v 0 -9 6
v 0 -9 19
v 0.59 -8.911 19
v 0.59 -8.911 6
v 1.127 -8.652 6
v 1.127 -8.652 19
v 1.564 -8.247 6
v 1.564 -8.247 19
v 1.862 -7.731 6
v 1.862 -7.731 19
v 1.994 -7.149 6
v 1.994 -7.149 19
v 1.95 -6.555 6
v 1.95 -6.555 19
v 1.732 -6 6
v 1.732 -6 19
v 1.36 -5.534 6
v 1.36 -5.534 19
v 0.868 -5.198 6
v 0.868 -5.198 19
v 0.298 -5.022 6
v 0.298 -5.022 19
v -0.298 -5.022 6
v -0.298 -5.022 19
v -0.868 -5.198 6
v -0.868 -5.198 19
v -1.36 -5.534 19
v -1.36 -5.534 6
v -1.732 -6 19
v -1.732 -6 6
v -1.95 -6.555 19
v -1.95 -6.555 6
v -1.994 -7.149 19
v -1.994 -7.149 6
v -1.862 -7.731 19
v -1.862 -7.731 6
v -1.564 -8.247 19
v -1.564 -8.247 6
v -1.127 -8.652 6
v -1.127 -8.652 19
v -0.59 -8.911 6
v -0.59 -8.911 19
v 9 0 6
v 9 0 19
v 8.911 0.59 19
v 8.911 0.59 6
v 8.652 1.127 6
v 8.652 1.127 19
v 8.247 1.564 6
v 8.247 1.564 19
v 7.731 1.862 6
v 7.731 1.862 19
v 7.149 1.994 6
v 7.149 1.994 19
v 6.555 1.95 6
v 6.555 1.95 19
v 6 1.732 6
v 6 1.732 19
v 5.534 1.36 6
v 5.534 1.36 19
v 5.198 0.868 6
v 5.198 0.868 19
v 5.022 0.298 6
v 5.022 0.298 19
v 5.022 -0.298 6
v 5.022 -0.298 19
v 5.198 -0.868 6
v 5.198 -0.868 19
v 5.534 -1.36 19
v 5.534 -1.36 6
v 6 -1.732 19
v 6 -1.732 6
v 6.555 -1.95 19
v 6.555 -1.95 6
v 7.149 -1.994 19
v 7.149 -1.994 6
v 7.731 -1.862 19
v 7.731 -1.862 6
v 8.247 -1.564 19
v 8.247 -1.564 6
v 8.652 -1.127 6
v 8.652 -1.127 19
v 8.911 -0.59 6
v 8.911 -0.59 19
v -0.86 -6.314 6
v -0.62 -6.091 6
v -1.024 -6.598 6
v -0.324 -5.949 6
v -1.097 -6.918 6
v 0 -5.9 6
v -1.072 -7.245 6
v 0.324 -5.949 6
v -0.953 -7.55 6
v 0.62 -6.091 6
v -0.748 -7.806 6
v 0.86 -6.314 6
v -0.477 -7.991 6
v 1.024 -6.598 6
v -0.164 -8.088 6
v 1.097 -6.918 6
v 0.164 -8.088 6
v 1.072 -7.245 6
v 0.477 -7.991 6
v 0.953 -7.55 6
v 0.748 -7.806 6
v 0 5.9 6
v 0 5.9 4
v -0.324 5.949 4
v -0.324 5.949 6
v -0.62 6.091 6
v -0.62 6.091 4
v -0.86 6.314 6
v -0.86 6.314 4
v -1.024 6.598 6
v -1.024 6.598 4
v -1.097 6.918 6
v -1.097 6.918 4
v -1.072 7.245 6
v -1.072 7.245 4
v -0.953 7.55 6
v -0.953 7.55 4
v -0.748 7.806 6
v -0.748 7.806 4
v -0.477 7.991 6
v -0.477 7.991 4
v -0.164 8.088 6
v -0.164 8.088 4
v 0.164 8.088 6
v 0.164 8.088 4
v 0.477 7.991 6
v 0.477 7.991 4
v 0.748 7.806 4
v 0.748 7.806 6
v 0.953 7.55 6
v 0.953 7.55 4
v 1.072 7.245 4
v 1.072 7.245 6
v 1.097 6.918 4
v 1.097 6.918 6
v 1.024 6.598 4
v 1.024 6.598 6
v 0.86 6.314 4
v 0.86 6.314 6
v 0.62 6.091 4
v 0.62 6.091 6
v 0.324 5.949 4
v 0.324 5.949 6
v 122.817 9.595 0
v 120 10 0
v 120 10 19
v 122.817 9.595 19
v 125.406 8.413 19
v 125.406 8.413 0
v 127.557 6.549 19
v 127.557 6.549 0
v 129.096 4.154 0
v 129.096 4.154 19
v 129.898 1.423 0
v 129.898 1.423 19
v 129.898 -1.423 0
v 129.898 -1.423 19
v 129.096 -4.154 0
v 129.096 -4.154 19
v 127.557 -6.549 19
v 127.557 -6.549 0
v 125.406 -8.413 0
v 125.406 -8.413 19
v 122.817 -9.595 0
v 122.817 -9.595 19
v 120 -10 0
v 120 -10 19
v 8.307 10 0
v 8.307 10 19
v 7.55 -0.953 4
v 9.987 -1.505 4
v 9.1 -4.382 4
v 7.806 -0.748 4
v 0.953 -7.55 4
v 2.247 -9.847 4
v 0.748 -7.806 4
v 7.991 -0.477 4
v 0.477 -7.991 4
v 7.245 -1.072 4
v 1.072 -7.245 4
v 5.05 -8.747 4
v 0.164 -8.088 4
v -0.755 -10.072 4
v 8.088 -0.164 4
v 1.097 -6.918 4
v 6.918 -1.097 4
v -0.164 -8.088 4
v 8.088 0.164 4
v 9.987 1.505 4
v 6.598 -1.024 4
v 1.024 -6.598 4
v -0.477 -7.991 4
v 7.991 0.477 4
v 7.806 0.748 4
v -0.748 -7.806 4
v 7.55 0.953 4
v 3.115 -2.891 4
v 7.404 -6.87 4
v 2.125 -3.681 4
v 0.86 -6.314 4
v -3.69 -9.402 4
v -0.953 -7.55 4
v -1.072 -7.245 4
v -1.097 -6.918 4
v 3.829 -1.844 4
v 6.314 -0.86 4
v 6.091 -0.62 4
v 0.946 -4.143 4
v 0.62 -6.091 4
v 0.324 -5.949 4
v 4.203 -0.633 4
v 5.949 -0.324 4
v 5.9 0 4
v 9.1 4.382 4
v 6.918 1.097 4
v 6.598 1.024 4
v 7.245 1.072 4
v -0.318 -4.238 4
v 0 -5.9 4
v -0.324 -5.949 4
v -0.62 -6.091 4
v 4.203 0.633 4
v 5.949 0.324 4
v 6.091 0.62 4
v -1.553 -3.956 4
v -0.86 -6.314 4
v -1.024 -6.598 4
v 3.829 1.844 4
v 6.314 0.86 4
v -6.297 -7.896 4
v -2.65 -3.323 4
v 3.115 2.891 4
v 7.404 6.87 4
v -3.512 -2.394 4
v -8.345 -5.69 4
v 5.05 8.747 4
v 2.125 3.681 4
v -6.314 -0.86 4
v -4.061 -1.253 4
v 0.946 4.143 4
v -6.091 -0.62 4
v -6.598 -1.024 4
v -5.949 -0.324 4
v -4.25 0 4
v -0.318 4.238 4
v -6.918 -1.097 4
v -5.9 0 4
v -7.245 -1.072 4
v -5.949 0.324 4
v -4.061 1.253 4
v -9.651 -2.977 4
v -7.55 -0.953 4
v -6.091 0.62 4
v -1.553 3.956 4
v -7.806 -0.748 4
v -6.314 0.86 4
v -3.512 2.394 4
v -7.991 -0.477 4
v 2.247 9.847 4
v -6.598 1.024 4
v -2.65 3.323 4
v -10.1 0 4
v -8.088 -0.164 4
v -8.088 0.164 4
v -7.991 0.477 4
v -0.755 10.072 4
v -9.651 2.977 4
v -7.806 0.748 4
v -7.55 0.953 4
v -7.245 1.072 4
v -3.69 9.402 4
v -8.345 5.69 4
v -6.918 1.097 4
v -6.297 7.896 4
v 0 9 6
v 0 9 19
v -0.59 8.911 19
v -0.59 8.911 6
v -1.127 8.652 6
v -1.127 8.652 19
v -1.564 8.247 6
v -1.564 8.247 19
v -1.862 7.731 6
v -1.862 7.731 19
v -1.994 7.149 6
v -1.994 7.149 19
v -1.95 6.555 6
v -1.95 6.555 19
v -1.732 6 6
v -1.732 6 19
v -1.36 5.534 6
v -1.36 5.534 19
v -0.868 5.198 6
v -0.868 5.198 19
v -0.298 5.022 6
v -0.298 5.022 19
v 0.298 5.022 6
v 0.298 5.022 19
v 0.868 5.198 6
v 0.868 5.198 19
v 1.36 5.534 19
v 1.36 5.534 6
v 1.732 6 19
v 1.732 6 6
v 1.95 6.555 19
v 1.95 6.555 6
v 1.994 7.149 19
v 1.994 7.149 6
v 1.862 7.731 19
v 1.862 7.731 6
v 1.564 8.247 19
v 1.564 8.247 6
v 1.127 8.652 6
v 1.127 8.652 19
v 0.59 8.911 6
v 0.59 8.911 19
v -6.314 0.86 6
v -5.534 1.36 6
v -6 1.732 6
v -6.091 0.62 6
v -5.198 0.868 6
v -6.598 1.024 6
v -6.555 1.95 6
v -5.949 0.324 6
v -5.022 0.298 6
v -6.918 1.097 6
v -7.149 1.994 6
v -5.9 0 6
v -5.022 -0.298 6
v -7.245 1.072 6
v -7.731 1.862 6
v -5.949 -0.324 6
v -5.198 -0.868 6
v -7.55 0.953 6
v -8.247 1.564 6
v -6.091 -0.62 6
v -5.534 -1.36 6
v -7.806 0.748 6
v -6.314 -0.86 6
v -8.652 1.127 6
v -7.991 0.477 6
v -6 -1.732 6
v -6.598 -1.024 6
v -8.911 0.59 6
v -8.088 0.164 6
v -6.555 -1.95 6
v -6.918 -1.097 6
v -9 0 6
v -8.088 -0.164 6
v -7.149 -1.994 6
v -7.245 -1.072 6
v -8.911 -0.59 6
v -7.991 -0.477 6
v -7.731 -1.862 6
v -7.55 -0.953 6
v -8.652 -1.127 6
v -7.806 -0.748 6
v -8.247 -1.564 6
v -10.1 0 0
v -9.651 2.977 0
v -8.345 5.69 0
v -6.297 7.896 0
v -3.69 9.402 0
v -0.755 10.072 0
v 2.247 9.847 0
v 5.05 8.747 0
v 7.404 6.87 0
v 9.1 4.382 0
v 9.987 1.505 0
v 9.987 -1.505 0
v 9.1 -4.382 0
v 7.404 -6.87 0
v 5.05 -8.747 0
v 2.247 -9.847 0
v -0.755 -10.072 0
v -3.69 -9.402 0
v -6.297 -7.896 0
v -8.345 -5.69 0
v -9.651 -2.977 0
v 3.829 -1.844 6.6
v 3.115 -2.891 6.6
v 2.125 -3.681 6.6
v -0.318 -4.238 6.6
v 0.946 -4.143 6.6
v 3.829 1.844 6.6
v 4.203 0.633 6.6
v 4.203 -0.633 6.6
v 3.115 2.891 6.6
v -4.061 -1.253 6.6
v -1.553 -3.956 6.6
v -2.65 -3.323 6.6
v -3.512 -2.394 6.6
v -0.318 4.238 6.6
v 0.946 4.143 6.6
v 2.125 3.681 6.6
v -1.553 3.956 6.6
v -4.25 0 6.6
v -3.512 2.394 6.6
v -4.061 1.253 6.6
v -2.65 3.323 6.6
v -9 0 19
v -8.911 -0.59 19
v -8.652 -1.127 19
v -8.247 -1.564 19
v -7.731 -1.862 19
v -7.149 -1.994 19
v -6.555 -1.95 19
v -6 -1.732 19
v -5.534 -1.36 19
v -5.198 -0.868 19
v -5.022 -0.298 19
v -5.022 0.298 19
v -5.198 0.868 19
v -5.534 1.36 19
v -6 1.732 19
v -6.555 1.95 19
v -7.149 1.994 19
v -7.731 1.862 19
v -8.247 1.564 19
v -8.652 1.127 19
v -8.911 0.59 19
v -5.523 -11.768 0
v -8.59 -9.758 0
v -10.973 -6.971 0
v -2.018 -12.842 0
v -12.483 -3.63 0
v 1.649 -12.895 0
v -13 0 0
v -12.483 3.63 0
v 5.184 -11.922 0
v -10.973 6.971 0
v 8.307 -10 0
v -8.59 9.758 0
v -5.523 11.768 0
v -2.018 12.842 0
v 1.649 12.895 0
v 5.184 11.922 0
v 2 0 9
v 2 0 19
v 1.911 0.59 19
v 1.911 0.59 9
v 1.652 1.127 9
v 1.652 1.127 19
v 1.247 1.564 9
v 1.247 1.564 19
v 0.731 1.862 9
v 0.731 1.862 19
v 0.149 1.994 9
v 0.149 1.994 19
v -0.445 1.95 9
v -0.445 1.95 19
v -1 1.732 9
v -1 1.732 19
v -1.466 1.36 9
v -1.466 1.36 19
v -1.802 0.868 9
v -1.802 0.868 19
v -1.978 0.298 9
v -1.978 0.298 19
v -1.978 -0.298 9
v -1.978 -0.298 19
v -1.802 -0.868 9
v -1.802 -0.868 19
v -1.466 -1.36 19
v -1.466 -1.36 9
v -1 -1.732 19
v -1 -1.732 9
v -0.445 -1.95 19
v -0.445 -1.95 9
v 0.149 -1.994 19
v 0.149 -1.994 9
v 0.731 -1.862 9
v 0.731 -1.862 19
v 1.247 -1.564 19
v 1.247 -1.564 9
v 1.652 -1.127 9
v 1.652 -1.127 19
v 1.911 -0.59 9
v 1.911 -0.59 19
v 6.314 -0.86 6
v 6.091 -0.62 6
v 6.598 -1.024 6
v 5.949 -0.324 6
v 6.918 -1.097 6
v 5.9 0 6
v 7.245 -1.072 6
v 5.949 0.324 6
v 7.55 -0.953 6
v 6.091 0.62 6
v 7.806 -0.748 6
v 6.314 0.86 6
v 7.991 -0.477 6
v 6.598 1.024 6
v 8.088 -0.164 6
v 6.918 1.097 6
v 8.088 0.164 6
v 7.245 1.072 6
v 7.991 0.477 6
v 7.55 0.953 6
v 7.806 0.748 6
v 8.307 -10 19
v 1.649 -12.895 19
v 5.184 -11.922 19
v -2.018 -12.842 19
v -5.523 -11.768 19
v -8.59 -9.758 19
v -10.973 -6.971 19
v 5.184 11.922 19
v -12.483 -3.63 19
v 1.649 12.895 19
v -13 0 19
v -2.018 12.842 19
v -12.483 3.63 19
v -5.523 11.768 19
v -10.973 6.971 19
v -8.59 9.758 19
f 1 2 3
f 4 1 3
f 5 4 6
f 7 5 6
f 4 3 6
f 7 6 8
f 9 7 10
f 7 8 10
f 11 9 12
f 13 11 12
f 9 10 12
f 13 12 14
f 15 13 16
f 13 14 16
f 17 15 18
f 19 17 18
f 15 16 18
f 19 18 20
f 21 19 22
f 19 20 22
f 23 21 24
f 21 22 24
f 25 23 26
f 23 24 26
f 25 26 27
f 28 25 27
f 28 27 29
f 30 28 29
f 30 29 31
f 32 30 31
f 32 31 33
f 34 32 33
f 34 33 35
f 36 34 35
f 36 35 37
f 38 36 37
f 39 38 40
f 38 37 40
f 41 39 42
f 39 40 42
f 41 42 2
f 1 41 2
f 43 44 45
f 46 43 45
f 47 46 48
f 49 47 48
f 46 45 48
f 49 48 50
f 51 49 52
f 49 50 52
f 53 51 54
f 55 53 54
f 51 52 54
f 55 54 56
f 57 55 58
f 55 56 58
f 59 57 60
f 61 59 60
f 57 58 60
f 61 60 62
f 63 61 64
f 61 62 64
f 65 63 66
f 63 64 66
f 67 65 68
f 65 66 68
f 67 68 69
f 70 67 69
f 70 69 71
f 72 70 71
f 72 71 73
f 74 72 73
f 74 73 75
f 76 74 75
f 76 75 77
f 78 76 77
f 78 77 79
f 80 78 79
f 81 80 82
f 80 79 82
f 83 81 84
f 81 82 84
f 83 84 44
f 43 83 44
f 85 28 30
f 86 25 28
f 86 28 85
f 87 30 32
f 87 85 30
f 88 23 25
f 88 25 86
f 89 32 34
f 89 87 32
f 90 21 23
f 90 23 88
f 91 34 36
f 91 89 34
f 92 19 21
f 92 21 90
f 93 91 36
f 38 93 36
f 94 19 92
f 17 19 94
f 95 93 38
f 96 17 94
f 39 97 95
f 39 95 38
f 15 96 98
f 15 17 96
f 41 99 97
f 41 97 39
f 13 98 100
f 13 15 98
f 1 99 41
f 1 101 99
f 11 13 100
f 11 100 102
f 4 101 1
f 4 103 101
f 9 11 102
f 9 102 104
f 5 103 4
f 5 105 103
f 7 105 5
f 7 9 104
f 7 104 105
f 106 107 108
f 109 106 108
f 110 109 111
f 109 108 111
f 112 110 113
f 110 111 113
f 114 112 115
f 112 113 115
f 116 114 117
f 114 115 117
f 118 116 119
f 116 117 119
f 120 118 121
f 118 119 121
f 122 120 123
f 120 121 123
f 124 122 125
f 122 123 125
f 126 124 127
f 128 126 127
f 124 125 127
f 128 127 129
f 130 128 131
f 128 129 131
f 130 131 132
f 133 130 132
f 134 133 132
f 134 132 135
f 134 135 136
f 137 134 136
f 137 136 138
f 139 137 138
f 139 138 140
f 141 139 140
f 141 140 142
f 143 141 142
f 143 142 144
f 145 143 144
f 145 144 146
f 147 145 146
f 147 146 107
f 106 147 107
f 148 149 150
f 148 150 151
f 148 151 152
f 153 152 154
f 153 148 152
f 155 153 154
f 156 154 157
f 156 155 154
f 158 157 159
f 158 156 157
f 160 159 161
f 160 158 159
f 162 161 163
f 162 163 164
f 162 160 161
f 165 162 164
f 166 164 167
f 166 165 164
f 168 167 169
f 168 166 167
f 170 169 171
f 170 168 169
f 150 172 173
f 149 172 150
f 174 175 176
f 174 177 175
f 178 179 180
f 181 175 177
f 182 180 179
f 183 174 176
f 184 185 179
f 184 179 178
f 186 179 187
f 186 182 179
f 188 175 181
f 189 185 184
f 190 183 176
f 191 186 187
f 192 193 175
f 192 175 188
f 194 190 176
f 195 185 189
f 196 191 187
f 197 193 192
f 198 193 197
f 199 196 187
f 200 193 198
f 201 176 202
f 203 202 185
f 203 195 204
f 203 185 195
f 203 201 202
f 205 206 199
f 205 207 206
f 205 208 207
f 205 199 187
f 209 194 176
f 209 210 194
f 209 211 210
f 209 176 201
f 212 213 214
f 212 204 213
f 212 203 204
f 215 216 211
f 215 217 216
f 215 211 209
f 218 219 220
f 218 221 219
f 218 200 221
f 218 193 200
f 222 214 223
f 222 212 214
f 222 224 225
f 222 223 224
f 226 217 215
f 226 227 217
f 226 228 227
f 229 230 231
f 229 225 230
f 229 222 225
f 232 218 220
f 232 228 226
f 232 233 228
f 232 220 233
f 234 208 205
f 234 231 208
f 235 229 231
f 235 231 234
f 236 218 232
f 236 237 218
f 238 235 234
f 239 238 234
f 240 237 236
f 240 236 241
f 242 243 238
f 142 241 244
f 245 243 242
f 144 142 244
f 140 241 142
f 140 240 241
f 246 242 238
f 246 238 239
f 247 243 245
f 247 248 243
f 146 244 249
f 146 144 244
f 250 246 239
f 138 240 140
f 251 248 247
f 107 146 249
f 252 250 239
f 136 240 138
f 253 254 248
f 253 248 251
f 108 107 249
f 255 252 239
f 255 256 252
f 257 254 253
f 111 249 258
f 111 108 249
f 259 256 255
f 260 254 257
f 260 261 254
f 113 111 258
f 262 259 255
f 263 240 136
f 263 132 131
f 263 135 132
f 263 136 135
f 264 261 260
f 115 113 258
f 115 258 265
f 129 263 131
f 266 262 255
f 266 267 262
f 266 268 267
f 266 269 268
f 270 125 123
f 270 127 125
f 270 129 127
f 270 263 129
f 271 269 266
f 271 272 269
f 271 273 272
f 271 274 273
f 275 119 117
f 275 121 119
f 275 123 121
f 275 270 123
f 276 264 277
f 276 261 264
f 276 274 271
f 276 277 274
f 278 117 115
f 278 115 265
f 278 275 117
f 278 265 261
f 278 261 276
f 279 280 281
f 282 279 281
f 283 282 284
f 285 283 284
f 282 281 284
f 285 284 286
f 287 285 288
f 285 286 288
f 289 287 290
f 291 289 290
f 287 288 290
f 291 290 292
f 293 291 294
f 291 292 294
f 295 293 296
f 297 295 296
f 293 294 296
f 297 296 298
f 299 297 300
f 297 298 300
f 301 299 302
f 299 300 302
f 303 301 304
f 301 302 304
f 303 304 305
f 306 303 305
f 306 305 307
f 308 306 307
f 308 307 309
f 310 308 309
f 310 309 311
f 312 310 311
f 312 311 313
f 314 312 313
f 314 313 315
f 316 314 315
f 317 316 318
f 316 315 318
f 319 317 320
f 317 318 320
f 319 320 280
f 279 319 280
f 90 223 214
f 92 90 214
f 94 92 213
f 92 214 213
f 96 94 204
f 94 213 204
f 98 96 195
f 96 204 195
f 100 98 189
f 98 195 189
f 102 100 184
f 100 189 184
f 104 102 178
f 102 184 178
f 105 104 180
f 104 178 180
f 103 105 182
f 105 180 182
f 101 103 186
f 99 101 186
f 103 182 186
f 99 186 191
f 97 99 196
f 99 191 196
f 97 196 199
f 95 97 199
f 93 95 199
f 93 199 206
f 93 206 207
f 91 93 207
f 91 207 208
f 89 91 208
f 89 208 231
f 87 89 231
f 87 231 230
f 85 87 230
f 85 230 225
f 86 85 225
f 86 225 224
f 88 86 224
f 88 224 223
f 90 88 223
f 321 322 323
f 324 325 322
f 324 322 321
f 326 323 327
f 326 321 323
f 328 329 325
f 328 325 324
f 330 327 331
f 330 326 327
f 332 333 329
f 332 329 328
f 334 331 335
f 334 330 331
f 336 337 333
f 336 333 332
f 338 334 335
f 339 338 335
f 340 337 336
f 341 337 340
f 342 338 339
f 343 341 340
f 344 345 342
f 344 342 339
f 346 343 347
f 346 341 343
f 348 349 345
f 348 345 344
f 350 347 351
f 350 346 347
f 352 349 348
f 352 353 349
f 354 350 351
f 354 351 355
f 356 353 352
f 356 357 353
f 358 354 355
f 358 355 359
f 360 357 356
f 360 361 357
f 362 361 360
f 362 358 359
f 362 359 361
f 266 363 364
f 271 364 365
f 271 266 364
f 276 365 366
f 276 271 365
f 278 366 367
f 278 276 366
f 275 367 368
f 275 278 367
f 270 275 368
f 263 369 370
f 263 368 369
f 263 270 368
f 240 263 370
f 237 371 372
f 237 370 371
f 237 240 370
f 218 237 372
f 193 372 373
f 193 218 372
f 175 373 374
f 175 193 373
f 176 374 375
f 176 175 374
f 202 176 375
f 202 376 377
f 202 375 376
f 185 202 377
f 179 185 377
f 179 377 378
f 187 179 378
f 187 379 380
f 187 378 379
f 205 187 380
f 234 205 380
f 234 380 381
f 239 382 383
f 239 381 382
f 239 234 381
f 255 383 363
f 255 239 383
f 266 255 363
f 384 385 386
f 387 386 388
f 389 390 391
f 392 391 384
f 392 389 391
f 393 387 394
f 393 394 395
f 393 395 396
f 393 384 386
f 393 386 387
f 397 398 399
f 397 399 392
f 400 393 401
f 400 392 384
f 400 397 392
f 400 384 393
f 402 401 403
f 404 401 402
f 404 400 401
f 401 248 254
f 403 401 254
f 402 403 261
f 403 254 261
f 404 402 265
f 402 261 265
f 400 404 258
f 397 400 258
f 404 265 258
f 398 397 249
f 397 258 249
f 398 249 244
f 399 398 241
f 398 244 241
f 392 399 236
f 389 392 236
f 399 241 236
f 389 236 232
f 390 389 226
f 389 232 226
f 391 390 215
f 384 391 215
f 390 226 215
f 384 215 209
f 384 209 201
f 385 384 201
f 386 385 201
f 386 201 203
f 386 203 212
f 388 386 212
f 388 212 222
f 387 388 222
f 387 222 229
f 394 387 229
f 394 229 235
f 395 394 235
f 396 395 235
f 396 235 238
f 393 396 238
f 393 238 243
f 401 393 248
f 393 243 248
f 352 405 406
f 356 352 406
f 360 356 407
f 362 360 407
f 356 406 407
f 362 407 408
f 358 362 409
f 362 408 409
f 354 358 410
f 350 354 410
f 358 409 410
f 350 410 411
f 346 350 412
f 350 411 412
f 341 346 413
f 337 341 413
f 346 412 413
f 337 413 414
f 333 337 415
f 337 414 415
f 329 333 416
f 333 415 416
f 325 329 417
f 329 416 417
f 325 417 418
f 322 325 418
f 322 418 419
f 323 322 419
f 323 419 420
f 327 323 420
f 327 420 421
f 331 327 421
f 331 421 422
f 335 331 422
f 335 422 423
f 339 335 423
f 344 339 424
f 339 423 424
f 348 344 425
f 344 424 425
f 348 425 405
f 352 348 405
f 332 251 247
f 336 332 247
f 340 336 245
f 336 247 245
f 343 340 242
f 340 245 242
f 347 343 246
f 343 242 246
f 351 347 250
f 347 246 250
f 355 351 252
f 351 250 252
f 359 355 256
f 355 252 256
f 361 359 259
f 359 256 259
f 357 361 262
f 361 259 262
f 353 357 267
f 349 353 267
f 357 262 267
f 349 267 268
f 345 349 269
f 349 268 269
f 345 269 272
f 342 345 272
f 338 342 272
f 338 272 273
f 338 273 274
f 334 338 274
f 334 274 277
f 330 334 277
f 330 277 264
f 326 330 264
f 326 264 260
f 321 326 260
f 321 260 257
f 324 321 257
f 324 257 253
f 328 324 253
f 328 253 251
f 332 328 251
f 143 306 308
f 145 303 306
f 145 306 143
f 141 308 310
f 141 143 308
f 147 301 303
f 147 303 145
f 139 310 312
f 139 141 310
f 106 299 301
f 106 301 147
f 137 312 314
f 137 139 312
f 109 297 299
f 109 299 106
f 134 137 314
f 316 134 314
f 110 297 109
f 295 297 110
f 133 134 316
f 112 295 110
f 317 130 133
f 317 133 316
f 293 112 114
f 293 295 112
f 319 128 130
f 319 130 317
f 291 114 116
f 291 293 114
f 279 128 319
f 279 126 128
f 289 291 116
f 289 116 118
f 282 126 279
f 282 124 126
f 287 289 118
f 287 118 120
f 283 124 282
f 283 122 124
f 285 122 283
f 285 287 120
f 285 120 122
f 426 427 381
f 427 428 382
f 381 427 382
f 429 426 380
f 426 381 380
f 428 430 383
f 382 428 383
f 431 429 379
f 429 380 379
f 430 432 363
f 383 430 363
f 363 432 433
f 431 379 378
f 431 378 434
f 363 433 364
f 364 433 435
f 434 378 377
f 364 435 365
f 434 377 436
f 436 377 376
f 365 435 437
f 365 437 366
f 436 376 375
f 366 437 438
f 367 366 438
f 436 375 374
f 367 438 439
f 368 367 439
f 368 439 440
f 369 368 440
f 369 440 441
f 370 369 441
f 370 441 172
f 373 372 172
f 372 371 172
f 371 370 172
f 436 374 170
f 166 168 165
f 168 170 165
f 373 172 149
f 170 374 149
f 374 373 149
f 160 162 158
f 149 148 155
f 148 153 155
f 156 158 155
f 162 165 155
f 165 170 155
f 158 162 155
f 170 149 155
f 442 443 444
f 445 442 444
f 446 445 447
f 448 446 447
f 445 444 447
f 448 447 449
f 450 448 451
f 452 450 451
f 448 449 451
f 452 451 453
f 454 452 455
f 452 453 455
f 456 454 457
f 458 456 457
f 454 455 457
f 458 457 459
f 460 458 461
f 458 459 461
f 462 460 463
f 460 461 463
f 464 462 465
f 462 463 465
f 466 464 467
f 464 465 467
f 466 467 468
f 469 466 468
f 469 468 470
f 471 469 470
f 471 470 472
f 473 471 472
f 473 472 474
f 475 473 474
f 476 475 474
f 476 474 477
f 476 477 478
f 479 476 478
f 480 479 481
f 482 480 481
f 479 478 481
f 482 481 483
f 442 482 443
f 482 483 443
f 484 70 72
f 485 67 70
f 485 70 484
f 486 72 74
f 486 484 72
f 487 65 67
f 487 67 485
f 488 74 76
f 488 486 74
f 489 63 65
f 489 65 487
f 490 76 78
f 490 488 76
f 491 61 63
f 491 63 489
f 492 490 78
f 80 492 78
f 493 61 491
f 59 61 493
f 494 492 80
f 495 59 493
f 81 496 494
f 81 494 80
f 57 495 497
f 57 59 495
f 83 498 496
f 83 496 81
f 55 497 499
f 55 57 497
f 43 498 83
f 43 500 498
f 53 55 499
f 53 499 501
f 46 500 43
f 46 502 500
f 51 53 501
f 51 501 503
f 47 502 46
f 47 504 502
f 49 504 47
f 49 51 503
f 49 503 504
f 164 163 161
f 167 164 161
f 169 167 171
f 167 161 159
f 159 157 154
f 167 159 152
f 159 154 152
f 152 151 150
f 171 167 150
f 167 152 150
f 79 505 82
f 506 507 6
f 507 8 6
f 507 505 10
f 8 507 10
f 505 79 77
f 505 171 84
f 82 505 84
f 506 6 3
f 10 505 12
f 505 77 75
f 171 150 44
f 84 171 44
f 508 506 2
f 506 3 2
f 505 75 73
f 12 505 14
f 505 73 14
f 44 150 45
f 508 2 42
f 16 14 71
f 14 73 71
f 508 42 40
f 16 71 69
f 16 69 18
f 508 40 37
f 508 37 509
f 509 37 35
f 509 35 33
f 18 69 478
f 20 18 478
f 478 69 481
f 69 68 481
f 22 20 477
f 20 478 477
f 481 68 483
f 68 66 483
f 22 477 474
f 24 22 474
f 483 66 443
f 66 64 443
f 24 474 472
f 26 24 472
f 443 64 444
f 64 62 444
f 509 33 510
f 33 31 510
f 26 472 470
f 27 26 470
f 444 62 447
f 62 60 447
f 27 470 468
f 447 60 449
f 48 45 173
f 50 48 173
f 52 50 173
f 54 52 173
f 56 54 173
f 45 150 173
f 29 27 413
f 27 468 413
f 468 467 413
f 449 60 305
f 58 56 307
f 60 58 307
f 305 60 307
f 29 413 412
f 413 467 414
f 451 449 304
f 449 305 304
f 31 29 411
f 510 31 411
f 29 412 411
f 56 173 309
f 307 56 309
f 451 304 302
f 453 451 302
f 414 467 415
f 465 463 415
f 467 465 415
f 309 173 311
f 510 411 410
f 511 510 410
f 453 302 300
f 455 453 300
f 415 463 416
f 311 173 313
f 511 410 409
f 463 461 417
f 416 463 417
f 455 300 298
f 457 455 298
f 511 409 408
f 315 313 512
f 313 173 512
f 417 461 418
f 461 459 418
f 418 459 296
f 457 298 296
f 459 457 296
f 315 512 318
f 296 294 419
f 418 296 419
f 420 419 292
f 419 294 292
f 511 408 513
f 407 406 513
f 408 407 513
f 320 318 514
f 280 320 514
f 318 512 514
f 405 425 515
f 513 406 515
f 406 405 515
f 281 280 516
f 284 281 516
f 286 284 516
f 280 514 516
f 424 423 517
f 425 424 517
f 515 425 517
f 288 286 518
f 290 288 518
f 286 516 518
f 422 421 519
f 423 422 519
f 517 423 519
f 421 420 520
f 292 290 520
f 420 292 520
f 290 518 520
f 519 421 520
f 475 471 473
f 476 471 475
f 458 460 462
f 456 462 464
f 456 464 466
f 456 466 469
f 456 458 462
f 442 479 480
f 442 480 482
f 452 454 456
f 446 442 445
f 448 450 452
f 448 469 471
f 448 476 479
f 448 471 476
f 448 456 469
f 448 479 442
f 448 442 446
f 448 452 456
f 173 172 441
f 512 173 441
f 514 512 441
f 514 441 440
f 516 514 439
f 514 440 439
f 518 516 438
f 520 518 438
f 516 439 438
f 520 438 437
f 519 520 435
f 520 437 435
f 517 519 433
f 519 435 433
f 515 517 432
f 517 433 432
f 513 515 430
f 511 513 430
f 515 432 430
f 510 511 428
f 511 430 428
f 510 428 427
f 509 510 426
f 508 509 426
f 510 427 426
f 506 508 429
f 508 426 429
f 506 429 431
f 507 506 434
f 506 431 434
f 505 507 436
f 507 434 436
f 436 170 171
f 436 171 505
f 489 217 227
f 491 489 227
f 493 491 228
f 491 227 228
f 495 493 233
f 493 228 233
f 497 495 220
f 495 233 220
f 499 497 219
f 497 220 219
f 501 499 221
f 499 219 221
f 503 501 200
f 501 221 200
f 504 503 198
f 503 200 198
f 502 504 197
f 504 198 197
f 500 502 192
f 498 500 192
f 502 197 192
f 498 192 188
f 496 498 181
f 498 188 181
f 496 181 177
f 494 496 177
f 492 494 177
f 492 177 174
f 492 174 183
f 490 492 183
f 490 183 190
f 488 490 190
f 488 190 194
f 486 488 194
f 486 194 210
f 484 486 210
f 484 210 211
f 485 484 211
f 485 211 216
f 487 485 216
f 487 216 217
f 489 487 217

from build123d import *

# Parameters (mm, degrees)
SKETCH1_R               = 13
ELBOW_BOSS_DEPTH        = 19
BAR_DEPTH               = 19
CUT_EXTRUDE1_DEPTH      = 133.022725317
CUT_EXTRUDE1_DEPTH_BACK = 4
SKETCH3_R               = 10.1
SKETCH4_R               = 4.25
CUT_EXTRUDE2_DEPTH      = 2.6
SKETCH5_R               = 2
CUT_EXTRUDE3_DEPTH      = 10
SKETCH6_R               = 2
CUT_EXTRUDE4_DEPTH      = 13
SKETCH7_R               = 1.1
CUT_EXTRUDE5_DEPTH      = 132.506653824
CIRPATTERN1_COUNT       = 4


with BuildPart() as part:
    # Sketch1 → Elbow Boss (new body)
    with BuildSketch(Plane.XY):
        Circle(SKETCH1_R)
    extrude(amount=ELBOW_BOSS_DEPTH)

    # Sketch2 → Bar (add)
    with BuildSketch(Plane.XY):
        with BuildLine():
            Line((0, 10), (120, 10))
            ThreePointArc((120, 10), (130, 0), (120, -10))
            Line((120, -10), (0, -10))
            ThreePointArc((0, -10), (-10, 0), (0, 10))
        make_face()
    extrude(amount=BAR_DEPTH)

    # Sketch3 → Cut-Extrude1 (cut, two sides: drawn at the far end of the back side and taken through both)
    with BuildSketch(Plane(origin=(0, 0, 0), x_dir=(-1, 0, 0), z_dir=(0, 0, -1)).offset(-CUT_EXTRUDE1_DEPTH_BACK)):
        Circle(SKETCH3_R)
    extrude(amount=CUT_EXTRUDE1_DEPTH + CUT_EXTRUDE1_DEPTH_BACK, mode=Mode.SUBTRACT)

    # Sketch4 → Cut-Extrude2 (cut)
    with BuildSketch(Plane(origin=(0, 0, 4), x_dir=(-1, 0, 0), z_dir=(0, 0, -1))):
        Circle(SKETCH4_R)
    extrude(amount=-CUT_EXTRUDE2_DEPTH, mode=Mode.SUBTRACT)

    # Sketch5 → Cut-Extrude3 (cut)
    with BuildSketch(Plane.XY.offset(19)):
        Circle(SKETCH5_R)
    extrude(amount=-CUT_EXTRUDE3_DEPTH, mode=Mode.SUBTRACT)

    # Sketch6 → Cut-Extrude4 (cut)
    with BuildSketch(Plane.XY.offset(19)):
        with Locations((7, 0)):
            Circle(SKETCH6_R)
    cut_extrude4 = extrude(amount=-CUT_EXTRUDE4_DEPTH, mode=Mode.SUBTRACT)

    # Sketch7 → Cut-Extrude5 (cut, through all)
    with BuildSketch(Plane(origin=(0, 0, 4), x_dir=(-1, 0, 0), z_dir=(0, 0, -1))):
        with Locations((-7, 0)):
            Circle(SKETCH7_R)
    cut_extrude5 = extrude(amount=-CUT_EXTRUDE5_DEPTH, mode=Mode.SUBTRACT)

    # CirPattern1: Cut-Extrude4, Cut-Extrude5 ×4 about axis
    cirpattern1_axis = Axis((0, 0, 9), (0, 0, 1))
    add([cut_extrude4.rotate(cirpattern1_axis, i * 360 / CIRPATTERN1_COUNT) for i in range(1, CIRPATTERN1_COUNT)], mode=Mode.SUBTRACT)
    add([cut_extrude5.rotate(cirpattern1_axis, i * 360 / CIRPATTERN1_COUNT) for i in range(1, CIRPATTERN1_COUNT)], mode=Mode.SUBTRACT)


solid = part.part
